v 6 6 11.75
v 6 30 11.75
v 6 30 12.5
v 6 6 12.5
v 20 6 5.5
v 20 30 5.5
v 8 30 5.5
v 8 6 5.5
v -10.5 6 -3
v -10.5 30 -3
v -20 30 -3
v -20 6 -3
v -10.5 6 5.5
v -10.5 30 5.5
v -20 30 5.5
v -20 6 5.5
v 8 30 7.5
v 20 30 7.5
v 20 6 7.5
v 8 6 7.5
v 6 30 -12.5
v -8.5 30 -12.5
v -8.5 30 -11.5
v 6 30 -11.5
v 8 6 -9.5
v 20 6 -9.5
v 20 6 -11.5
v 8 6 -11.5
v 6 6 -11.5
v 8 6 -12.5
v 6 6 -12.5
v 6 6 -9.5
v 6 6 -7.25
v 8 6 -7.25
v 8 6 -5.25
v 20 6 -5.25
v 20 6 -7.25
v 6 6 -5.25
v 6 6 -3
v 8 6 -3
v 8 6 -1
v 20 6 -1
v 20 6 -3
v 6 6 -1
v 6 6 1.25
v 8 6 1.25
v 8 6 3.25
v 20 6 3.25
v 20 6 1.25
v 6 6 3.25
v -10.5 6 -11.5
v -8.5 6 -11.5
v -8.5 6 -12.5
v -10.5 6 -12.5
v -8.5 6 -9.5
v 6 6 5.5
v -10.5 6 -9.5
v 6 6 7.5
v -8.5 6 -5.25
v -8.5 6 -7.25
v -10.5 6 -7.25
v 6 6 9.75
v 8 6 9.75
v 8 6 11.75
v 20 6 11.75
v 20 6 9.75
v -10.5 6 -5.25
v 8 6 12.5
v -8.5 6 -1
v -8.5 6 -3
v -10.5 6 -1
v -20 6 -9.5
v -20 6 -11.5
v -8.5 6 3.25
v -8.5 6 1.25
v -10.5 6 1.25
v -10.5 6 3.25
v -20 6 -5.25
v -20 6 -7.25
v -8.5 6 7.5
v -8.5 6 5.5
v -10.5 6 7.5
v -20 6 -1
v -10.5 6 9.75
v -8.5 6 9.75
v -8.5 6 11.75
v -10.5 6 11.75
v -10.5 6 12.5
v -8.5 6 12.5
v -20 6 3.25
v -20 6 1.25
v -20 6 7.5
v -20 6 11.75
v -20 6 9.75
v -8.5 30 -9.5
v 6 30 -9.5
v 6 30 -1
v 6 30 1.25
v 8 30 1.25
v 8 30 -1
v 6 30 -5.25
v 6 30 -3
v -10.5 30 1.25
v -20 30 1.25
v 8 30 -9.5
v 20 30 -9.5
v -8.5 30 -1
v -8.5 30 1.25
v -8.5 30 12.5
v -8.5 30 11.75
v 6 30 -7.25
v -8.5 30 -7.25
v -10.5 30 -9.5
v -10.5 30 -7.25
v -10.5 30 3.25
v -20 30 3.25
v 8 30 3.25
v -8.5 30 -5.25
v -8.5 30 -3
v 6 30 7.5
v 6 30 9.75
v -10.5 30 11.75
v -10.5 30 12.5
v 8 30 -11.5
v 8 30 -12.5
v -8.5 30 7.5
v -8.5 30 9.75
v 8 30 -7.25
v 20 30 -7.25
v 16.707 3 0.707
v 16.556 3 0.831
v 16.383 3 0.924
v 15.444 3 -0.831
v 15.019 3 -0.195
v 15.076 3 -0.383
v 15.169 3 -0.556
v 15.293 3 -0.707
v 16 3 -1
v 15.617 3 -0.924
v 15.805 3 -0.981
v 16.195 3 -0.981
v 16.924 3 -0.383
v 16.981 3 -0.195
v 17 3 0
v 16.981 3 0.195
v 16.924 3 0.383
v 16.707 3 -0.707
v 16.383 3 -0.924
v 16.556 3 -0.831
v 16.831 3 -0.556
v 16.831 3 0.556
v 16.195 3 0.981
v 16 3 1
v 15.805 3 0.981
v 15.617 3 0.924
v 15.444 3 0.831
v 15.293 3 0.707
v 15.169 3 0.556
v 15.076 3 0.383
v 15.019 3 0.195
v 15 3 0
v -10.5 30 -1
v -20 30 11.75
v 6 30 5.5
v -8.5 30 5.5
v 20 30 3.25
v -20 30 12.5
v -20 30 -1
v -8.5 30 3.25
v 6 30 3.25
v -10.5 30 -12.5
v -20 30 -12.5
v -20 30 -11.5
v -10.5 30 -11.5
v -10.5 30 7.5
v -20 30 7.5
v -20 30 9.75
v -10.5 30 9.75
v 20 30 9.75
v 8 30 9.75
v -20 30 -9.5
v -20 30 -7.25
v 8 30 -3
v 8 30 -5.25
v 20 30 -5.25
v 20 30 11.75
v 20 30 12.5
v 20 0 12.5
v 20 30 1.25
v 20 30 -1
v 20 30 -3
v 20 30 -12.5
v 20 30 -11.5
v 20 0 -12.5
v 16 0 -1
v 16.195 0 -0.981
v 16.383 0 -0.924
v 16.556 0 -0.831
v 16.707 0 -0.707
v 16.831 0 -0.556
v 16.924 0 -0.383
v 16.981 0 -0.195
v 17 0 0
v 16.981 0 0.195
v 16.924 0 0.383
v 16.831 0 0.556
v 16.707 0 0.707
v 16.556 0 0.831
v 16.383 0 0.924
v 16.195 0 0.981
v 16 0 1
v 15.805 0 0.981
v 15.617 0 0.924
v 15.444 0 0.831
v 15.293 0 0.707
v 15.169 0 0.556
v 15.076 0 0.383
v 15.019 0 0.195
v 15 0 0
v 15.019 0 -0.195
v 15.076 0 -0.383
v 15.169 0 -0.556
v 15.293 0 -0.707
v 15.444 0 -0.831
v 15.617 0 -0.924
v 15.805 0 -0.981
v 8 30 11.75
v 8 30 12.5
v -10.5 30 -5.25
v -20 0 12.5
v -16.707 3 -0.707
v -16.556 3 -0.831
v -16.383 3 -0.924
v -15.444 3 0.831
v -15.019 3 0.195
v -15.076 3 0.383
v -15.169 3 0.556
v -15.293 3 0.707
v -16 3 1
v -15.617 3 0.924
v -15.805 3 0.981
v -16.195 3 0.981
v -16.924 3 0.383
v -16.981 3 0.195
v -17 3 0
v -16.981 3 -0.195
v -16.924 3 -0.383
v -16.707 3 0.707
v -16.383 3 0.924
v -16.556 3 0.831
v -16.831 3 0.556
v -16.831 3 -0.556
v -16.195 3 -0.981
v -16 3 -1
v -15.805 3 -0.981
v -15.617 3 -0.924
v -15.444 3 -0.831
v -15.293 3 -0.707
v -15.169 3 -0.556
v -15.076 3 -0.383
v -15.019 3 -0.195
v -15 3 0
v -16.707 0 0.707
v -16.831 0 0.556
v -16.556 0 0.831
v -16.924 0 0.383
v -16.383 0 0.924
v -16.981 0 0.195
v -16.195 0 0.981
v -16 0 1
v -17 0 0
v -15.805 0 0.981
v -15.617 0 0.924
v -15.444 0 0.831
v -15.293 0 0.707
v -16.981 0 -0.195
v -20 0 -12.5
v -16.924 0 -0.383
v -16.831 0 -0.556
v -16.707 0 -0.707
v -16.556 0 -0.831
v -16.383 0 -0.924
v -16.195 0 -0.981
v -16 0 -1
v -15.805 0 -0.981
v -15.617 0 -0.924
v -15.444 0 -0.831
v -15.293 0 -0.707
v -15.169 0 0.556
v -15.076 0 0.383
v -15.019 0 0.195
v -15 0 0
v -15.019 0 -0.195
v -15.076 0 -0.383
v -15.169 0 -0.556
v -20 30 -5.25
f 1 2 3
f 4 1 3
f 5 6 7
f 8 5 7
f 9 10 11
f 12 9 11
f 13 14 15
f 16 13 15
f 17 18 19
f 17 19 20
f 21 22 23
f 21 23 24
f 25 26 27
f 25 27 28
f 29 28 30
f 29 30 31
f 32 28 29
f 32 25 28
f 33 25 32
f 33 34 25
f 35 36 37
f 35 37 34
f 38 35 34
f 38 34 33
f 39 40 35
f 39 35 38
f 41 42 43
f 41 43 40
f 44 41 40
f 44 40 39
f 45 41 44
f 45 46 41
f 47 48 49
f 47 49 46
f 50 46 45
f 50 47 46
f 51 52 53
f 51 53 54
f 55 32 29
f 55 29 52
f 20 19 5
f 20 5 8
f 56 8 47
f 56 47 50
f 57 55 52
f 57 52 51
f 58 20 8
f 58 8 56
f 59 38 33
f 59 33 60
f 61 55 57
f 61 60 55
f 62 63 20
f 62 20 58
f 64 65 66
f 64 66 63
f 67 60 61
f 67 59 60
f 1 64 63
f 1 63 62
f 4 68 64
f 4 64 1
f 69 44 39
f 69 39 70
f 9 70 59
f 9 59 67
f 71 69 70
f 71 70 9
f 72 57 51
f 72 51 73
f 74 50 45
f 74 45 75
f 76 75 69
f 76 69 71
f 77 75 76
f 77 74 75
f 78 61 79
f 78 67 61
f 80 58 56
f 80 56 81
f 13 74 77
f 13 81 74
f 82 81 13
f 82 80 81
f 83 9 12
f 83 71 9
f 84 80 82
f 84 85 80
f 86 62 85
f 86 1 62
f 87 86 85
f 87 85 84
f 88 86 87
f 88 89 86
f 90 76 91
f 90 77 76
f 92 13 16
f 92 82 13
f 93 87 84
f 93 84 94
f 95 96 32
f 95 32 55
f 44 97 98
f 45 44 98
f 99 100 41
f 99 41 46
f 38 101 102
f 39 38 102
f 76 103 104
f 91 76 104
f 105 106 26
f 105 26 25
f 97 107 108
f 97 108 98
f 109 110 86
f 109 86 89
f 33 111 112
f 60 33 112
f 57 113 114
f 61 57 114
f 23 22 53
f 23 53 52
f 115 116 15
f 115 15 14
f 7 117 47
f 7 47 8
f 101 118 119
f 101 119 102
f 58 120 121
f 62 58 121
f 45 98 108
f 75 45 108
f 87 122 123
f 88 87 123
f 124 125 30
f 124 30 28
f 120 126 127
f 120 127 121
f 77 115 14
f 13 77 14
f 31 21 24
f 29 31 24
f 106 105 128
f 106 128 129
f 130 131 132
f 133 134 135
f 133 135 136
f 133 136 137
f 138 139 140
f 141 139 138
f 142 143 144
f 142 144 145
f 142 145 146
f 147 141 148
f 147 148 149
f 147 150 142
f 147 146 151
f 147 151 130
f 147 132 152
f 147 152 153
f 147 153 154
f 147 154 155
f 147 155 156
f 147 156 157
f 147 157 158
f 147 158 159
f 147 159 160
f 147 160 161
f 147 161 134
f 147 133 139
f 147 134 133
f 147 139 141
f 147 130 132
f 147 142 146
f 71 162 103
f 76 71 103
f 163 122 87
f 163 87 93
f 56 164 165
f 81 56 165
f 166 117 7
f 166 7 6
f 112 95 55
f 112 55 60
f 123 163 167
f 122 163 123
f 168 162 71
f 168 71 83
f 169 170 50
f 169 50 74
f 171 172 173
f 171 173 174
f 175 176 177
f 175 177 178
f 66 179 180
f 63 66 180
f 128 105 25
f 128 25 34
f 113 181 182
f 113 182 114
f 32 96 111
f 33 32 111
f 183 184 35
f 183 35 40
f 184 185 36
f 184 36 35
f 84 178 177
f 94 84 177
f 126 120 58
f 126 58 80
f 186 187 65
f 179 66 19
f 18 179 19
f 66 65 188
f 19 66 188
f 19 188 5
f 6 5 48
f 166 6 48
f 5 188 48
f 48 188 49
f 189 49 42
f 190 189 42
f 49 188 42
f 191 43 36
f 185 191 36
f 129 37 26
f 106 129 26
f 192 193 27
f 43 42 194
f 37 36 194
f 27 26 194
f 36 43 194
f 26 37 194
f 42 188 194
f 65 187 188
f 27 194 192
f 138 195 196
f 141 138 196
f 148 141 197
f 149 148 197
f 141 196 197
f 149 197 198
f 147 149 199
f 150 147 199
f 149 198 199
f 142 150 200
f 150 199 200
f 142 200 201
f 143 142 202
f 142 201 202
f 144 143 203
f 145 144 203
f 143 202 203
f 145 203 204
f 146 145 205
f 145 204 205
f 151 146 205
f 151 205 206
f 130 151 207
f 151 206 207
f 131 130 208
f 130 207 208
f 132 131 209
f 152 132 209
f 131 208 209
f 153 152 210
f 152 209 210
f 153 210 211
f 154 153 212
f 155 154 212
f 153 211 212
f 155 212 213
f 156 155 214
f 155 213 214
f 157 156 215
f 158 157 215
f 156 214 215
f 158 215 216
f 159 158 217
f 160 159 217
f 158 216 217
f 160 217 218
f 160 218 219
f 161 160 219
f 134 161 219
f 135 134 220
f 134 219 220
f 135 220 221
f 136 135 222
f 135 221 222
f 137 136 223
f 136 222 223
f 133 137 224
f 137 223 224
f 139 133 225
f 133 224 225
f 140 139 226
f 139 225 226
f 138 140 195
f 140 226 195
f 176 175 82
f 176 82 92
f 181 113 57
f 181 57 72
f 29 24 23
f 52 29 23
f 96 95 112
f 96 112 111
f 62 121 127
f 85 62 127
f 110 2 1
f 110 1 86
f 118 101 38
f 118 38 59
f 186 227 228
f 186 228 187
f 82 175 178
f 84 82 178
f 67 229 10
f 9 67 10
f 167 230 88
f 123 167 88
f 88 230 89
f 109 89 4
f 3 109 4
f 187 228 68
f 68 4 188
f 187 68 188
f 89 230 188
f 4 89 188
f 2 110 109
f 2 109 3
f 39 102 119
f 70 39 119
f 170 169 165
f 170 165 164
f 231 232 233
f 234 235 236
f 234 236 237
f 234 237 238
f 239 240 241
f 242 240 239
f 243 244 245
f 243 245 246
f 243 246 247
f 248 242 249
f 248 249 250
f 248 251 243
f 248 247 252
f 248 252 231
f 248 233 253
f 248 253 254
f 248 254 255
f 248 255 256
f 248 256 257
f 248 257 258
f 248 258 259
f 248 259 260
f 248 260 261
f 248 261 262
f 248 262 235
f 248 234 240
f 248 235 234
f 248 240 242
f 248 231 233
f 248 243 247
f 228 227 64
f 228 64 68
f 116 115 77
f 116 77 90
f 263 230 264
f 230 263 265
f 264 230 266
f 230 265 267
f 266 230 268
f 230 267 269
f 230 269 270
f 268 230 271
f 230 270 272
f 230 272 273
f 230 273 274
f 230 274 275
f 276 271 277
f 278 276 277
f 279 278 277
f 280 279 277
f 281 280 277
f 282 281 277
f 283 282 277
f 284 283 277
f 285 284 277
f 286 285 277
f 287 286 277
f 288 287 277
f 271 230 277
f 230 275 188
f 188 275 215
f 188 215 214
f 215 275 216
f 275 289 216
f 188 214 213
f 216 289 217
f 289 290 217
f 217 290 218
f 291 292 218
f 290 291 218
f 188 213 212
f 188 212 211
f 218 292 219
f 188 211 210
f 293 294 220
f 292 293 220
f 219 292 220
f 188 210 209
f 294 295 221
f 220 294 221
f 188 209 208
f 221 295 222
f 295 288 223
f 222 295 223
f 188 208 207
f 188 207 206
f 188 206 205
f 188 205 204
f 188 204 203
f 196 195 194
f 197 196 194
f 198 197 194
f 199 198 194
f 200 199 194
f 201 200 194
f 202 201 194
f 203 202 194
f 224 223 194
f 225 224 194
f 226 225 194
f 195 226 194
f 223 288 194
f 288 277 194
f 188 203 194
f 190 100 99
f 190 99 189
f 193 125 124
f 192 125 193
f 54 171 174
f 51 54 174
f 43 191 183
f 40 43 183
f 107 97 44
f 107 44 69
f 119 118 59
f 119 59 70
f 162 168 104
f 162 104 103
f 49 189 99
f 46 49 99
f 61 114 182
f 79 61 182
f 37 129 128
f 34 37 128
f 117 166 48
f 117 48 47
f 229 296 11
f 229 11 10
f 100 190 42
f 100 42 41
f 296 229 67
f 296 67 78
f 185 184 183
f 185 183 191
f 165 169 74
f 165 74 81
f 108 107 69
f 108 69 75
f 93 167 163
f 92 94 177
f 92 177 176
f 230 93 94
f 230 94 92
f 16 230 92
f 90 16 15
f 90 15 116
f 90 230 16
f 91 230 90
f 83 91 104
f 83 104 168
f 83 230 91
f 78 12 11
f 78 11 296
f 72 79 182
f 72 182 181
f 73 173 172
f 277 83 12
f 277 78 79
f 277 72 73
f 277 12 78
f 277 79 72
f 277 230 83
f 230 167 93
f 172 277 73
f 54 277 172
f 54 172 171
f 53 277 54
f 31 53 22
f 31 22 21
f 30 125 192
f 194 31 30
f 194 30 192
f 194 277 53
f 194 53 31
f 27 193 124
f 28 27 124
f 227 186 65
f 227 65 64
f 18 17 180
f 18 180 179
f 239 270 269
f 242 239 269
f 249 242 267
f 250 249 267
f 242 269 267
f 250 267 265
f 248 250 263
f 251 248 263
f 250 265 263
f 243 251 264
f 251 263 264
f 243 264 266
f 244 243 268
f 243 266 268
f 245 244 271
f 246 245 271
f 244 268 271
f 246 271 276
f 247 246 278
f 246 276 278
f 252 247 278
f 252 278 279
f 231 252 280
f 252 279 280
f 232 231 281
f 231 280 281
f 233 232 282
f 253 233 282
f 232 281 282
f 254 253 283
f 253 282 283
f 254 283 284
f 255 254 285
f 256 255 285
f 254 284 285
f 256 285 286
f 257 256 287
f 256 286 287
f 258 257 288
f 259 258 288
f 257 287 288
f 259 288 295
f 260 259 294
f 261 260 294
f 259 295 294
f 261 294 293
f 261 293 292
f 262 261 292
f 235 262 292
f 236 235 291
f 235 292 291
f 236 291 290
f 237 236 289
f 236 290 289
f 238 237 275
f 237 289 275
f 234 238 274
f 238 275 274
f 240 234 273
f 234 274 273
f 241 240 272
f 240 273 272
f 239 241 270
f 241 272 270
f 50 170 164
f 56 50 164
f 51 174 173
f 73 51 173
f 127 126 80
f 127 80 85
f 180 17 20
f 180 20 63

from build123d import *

# Parameters (mm, degrees)
SKETCH_1_W          = 40
SKETCH_1_H          = 25
EXTRUDE_1_DEPTH     = 30
SKETCH_2_W          = 40
SKETCH_2_H          = 2
CUT_EXTRUDE_1_DEPTH = 24
SKETCH_3_W          = 2
SKETCH_3_H          = 25
CUT_EXTRUDE_2_DEPTH = 24
SKETCH_4_R          = 1
CUT_EXTRUDE_3_DEPTH = 3


with BuildPart() as part:
    # 草图1 → 拉伸1 (new body)
    with BuildSketch(Plane(origin=(0, 0, 0), x_dir=(1, 0, 0), z_dir=(0, 1, 0))):
        Rectangle(SKETCH_1_W, SKETCH_1_H)
    extrude(amount=EXTRUDE_1_DEPTH)

    # 草图2 → 切除-拉伸1 (cut)
    with BuildSketch(Plane(origin=(0, 30, 0), x_dir=(-1, 0, 0), z_dir=(0, 1, 0))):
        with Locations((0, -10.5)):
            Rectangle(SKETCH_2_W, SKETCH_2_H)
        with Locations((0, -6.25)):
            Rectangle(SKETCH_2_W, SKETCH_2_H)
        with Locations((0, -2)):
            Rectangle(SKETCH_2_W, SKETCH_2_H)
        with Locations((0, 2.25)):
            Rectangle(SKETCH_2_W, SKETCH_2_H)
        with Locations((0, 6.5)):
            Rectangle(SKETCH_2_W, SKETCH_2_H)
        with Locations((0, 10.75)):
            Rectangle(SKETCH_2_W, SKETCH_2_H)
    extrude(amount=-CUT_EXTRUDE_1_DEPTH, mode=Mode.SUBTRACT)

    # 草图3 → 切除-拉伸2 (cut)
    with BuildSketch(Plane(origin=(0, 30, 0), x_dir=(-1, 0, 0), z_dir=(0, 1, 0))):
        with Locations((-7, 0)):
            Rectangle(SKETCH_3_W, SKETCH_3_H)
        with Locations((9.5, 0)):
            Rectangle(SKETCH_3_W, SKETCH_3_H)
    extrude(amount=-CUT_EXTRUDE_2_DEPTH, mode=Mode.SUBTRACT)

    # 草图4 → 切除-拉伸3 (cut)
    with BuildSketch(Plane.XZ):
        with Locations(Location((16, 0, 0), (0, 0, 270))):
            Circle(SKETCH_4_R)
        with Locations(Location((-16, 0, 0), (0, 0, 90))):
            Circle(SKETCH_4_R)
    extrude(amount=-CUT_EXTRUDE_3_DEPTH, mode=Mode.SUBTRACT)


solid = part.part
